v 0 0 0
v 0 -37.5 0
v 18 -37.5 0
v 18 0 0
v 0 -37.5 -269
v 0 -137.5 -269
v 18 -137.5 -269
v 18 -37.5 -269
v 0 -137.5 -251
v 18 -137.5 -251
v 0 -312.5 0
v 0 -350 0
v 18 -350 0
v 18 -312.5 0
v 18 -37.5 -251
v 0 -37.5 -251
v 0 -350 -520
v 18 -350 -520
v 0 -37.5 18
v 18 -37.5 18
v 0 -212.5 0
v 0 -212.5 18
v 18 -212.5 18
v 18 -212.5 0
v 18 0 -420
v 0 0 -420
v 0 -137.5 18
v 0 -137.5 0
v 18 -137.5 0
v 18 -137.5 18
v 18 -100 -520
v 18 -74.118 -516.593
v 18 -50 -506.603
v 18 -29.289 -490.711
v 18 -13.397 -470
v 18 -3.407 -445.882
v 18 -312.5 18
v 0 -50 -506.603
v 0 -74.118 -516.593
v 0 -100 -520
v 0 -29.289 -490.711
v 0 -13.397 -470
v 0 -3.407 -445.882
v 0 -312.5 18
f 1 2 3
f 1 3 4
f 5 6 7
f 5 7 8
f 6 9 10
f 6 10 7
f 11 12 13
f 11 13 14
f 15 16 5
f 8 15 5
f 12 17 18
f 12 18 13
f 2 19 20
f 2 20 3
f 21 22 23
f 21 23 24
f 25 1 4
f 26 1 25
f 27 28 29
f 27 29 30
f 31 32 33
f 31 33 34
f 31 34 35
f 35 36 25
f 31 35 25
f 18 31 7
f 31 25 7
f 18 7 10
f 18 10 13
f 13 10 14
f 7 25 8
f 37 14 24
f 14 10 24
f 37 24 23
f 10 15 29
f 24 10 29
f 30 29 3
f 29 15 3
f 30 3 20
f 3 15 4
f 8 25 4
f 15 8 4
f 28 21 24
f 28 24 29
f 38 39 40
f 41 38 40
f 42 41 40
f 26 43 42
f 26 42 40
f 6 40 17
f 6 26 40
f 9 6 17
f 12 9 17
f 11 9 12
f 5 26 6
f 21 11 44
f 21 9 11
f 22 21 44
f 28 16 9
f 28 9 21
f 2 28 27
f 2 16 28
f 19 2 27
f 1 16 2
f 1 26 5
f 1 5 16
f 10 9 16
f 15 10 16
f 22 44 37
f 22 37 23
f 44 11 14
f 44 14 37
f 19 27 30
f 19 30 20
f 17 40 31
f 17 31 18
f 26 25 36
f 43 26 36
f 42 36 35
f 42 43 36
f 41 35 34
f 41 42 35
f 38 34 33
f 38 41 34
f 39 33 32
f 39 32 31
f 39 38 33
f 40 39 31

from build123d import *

# Parameters (mm, degrees)
SKETCH1_W           = 18
SKETCH1_H           = 100
BOSS_EXTRUDE3_DEPTH = 18


with BuildPart() as part:
    # Sketch1 → Boss-Extrude3 (new body)
    with BuildSketch(Plane(origin=(0, 0, 0), x_dir=(0, 0, -1), z_dir=(1, 0, 0))):
        with BuildLine():
            Line((0, 0), (420, 0))
            ThreePointArc((420, 0), (490.710678119, -29.289321881), (520, -100))
            Line((520, -100), (520, -350))
            Line((520, -350), (0, -350))
            Line((0, -350), (0, -312.5))
            Line((0, -312.5), (-18, -312.5))
            Line((-18, -312.5), (-18, -212.5))
            Line((-18, -212.5), (0, -212.5))
            Line((0, -212.5), (0, -137.5))
            Line((0, -137.5), (-18, -137.5))
            Line((-18, -137.5), (-18, -37.5))
            Line((-18, -37.5), (0, -37.5))
            Line((0, -37.5), (0, 0))
        make_face()
        with Locations((260, -87.5)):
            Rectangle(SKETCH1_W, SKETCH1_H, mode=Mode.SUBTRACT)
    extrude(amount=BOSS_EXTRUDE3_DEPTH)


solid = part.part
